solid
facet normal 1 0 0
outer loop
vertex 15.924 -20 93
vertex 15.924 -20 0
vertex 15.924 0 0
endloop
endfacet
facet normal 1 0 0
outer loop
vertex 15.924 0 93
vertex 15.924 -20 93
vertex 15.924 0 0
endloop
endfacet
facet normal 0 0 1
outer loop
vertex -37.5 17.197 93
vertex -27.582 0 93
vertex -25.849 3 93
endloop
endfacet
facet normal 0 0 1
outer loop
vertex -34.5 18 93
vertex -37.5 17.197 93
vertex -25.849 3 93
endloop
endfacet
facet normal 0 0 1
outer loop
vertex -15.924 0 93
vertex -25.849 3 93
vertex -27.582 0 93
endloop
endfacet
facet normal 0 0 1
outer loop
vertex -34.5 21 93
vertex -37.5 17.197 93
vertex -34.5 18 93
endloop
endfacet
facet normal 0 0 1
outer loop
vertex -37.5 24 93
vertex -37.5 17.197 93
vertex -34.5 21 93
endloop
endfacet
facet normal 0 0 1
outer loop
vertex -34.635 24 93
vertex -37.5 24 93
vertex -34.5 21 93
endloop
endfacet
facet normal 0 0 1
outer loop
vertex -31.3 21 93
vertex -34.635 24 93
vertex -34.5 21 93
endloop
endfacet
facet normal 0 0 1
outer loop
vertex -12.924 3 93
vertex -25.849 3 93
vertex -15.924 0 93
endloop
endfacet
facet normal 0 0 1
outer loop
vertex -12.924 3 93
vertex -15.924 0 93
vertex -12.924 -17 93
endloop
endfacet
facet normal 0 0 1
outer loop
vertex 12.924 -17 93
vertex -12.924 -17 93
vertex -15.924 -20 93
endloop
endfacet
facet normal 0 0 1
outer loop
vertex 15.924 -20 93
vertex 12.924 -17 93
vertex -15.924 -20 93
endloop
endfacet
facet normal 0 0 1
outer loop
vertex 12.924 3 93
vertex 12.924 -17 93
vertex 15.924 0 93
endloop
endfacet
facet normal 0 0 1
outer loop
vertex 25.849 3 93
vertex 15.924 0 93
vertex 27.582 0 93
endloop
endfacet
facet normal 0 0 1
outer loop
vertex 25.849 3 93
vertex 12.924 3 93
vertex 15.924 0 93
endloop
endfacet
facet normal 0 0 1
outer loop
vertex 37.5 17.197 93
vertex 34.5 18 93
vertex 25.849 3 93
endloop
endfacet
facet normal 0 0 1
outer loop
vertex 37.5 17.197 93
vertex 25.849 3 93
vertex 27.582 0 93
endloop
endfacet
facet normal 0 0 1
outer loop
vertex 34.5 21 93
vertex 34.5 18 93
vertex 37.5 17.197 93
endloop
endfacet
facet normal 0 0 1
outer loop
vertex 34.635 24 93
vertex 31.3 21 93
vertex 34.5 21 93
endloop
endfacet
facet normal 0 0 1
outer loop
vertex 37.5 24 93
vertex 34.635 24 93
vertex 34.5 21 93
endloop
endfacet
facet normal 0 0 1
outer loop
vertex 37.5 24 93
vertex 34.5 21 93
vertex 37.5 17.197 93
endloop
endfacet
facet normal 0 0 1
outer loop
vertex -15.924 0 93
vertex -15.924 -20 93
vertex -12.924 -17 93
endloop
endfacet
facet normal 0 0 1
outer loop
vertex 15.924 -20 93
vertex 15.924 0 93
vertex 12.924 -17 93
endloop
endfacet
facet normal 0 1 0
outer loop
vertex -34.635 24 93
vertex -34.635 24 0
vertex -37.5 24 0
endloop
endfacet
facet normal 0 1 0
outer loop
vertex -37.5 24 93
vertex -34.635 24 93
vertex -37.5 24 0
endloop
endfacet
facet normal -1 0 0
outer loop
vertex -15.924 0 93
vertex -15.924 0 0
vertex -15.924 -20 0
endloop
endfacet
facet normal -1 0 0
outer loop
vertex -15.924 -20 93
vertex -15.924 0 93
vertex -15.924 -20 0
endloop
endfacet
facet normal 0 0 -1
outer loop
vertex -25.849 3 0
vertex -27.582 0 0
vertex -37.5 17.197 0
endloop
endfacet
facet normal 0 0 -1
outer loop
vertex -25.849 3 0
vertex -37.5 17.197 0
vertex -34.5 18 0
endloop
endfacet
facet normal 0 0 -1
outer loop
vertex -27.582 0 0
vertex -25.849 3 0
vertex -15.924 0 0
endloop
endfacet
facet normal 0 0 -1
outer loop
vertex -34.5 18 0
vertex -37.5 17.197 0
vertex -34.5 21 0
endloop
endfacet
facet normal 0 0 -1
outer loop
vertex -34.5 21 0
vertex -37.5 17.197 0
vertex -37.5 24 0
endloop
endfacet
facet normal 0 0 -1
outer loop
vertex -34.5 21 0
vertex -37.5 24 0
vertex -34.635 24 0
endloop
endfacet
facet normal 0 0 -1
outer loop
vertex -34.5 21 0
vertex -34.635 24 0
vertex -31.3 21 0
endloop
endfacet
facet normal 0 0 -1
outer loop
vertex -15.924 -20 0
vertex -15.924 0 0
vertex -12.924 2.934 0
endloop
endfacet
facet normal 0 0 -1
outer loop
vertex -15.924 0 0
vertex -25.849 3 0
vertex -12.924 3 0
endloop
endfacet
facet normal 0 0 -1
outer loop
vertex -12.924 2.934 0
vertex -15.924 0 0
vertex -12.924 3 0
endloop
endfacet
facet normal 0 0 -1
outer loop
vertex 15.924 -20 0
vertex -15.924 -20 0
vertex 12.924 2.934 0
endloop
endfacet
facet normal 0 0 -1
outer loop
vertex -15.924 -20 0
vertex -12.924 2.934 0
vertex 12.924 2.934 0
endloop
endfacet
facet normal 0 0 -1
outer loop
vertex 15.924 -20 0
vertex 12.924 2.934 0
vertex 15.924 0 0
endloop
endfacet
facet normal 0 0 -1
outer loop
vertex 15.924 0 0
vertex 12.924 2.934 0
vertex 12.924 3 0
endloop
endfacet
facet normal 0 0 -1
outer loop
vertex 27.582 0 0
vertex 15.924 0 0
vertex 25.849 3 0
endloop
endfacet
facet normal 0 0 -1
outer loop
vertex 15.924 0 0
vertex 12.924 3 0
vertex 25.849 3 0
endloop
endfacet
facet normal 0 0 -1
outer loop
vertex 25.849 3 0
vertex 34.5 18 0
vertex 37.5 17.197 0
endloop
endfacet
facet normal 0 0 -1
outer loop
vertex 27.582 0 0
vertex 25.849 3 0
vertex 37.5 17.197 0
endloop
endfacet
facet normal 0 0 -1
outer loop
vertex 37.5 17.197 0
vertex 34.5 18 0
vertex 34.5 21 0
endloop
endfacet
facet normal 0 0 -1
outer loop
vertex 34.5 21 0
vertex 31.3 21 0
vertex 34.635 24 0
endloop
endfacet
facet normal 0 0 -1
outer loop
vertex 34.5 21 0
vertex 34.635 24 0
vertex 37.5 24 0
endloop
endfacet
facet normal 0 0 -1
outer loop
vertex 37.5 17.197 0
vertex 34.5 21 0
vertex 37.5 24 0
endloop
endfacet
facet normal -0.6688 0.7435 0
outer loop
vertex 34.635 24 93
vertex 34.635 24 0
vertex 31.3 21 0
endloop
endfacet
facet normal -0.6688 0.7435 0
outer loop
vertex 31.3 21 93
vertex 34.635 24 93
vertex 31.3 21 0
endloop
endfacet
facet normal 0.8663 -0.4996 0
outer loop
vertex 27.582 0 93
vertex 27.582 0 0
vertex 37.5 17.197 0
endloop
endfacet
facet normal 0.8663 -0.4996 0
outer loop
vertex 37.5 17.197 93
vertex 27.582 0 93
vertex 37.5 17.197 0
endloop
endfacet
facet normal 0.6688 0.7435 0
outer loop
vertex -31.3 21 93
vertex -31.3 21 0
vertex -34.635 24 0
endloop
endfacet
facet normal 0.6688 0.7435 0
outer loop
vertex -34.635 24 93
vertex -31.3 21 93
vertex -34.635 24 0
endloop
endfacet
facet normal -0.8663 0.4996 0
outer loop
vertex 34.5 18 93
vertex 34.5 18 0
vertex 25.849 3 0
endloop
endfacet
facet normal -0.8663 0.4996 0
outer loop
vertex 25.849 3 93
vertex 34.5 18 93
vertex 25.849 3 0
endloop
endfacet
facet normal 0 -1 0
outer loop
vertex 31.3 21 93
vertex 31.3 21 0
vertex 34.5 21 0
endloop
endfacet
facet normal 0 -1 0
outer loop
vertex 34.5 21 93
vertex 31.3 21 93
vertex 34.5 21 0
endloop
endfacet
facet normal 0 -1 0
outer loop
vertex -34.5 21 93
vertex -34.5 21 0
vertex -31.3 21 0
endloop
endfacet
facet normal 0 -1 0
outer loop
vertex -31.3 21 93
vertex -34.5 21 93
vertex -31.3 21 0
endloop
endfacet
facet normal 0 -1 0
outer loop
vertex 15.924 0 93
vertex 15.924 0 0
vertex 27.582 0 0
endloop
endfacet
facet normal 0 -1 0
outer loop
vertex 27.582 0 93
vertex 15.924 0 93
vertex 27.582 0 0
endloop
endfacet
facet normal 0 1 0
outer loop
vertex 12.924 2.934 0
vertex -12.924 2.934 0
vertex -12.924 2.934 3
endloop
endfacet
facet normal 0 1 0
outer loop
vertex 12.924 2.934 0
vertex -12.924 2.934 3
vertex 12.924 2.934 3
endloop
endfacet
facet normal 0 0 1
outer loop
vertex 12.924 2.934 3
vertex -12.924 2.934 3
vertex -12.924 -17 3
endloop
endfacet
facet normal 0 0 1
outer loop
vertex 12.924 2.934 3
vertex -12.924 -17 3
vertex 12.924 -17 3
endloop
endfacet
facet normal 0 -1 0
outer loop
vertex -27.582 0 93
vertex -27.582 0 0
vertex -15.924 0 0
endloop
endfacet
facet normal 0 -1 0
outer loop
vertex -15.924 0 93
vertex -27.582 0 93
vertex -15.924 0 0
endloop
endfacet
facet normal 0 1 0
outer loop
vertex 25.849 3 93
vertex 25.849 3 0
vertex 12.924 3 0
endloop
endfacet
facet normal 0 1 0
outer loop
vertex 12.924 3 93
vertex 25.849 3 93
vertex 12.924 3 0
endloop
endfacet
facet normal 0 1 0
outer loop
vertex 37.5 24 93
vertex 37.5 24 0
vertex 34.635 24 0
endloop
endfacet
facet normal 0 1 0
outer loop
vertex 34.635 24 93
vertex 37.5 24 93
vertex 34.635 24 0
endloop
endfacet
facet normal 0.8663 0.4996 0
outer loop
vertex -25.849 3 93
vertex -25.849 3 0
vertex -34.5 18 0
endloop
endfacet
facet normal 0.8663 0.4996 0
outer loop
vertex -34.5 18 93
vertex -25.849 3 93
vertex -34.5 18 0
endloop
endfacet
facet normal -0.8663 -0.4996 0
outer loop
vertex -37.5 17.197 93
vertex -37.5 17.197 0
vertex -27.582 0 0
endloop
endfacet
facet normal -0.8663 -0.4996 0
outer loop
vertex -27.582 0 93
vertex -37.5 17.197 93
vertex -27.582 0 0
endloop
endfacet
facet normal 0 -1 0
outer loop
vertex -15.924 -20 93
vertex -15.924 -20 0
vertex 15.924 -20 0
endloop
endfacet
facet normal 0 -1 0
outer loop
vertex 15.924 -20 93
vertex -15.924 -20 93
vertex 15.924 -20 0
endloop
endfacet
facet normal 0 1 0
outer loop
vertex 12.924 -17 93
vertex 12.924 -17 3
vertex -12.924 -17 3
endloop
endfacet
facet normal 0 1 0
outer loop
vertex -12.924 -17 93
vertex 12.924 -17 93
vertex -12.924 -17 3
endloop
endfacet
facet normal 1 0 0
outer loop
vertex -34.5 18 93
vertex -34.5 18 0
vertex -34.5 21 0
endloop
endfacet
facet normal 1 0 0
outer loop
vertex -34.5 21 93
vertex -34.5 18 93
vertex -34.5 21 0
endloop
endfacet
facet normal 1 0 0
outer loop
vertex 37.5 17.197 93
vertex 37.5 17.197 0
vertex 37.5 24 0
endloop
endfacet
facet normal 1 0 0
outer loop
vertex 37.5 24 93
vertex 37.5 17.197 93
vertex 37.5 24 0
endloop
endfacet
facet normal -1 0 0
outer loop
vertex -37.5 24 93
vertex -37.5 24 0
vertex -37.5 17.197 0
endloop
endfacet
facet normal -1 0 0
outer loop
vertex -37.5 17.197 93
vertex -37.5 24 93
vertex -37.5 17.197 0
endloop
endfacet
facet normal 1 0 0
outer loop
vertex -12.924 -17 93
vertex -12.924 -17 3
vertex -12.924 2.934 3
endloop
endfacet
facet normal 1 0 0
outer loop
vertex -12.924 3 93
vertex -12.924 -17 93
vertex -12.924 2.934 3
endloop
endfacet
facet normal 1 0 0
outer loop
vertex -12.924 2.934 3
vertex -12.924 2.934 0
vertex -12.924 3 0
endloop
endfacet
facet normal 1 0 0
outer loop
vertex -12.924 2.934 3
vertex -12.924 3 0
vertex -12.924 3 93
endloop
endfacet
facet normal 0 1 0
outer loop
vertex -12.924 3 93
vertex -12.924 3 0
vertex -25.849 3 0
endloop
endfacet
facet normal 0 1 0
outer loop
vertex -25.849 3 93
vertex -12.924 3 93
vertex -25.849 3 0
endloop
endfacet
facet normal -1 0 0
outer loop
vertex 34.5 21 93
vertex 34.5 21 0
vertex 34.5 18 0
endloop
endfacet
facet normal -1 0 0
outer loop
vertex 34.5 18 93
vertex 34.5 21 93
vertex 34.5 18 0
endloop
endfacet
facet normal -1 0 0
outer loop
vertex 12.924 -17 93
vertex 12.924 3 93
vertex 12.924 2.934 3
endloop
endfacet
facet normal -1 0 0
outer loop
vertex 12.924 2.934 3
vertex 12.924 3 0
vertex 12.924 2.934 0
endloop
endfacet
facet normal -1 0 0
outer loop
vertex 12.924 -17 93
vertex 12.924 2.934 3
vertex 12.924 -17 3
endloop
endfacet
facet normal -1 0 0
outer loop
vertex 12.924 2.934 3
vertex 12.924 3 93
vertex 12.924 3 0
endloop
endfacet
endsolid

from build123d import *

# Parameters (mm, degrees)
F1_DEPTH = 93
F2_W     = 30.76568
F2_H     = 21.780368
F3_DEPTH = 3


with BuildPart() as f1:
    # F0 (on Top) → F1 (new body)
    with BuildSketch(Plane.XY):
        Polygon((15.92357, 0), (27.581504, 0), (37.5, 17.196862), (37.5, 24), (34.635104, 24), (31.3, 21), (34.5, 21), (34.5, 18), (25.84857, 3), (12.92357, 3), (12.92357, -17), (-12.92407, -17), (-12.92407, 3), (-25.84857, 3), (-34.5, 18), (-34.5, 21), (-31.3, 21), (-34.635104, 24), (-37.5, 24), (-37.5, 17.196862), (-27.581504, 0), (-15.92407, 0), (-15.92407, -20), (-12.92407, -20), (12.92357, -20), (15.92357, -20), align=None)
    extrude(amount=F1_DEPTH)

    # F2 (on Top) → F3 (join)
    with BuildSketch(Plane.XY):
        with Locations((-0.194695, -7.955824)):
            Rectangle(F2_W, F2_H)
    extrude(amount=F3_DEPTH)


solid = f1.part
